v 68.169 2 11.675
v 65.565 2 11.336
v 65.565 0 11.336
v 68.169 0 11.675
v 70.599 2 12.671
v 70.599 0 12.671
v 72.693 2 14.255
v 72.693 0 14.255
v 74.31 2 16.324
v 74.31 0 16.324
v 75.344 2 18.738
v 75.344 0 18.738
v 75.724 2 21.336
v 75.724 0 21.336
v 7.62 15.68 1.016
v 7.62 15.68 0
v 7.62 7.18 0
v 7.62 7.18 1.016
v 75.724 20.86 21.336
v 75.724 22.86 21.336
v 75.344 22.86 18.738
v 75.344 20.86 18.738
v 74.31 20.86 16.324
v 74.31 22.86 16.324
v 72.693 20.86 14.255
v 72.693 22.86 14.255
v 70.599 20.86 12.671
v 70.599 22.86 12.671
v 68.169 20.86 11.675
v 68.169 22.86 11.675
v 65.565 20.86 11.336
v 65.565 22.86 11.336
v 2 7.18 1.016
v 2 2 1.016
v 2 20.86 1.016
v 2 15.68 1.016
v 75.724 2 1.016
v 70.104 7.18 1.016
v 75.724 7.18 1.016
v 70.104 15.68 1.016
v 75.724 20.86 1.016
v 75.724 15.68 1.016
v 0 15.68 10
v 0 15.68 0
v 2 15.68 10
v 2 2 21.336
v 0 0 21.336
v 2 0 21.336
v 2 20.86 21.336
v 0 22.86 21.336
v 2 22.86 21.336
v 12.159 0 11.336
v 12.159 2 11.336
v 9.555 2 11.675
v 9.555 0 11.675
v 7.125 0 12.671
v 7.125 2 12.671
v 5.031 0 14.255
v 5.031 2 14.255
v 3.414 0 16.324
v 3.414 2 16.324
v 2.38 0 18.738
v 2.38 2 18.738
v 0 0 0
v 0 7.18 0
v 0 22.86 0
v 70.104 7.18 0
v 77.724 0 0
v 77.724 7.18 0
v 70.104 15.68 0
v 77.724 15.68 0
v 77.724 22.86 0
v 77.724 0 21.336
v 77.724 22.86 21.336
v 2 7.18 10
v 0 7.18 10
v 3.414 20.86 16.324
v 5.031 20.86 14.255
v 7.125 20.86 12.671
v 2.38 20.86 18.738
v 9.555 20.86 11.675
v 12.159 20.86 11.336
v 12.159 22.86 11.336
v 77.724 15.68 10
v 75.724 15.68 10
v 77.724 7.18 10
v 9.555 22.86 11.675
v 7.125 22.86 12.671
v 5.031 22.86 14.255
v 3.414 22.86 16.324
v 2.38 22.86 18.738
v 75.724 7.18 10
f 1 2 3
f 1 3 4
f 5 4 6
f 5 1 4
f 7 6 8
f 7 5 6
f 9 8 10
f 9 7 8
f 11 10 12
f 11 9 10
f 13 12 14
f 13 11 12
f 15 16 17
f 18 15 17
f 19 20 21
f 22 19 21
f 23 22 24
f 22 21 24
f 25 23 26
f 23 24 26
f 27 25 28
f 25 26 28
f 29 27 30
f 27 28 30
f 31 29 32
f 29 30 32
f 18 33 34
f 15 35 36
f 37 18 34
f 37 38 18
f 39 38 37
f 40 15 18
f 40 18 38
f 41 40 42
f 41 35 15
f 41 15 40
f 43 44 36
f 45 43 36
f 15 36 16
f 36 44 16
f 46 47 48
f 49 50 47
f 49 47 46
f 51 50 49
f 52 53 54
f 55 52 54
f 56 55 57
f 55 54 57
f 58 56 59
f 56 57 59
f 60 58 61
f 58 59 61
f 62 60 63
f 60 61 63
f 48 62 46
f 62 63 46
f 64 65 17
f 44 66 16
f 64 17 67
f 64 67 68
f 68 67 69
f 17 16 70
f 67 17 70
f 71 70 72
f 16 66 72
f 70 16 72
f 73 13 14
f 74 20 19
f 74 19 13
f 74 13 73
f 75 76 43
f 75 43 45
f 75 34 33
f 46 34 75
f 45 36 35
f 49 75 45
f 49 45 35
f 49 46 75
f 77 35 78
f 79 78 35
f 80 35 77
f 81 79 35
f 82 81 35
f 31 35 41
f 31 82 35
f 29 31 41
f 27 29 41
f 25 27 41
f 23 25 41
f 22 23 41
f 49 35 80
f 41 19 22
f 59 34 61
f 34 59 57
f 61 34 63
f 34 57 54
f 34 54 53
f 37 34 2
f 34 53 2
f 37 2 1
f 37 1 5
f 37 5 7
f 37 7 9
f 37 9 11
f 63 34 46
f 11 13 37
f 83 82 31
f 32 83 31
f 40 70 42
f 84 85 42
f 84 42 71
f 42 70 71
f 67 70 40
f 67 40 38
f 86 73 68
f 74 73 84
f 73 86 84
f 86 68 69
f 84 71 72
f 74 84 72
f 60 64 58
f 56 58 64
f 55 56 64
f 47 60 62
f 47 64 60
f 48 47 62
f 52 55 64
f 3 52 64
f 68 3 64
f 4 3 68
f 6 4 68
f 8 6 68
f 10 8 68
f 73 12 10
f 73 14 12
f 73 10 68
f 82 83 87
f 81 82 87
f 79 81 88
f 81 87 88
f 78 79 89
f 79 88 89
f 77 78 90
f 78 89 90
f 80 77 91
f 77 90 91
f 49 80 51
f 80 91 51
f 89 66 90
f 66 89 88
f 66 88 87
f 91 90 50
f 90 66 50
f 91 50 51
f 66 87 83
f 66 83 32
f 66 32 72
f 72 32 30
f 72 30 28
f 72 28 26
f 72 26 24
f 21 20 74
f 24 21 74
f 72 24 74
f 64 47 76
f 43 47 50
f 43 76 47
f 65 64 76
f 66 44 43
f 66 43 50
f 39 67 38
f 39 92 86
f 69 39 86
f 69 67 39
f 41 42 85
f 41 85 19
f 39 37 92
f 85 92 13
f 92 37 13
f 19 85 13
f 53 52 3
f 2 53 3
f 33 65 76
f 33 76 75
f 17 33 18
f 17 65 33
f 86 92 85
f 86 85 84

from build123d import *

# Parameters (mm, degrees)
F0_W          = 77.724
F0_H          = 22.86
F1_DEPTH      = 21.336
F2_W          = 73.724
F2_H          = 18.86
F3_DEPTH      = 20.32
F4_W          = 7.62
F4_H          = 8.5
F5_DEPTH      = 10
F6_W          = 73.724
F6_H          = 10
F7_DEPTH      = 25
F7_DEPTH_BACK = 25
F8_T1_DEPTH   = 2
F8_T3_DEPTH   = 2
F8_T8_DEPTH   = 52.7937003968
F8_T14_DEPTH  = 52.7937003968
F8_T20_DEPTH  = 52.7937003968
F8_T26_DEPTH  = 52.7937003968


# Not quite as in the source:
# - a fillet or chamfer that OpenCascade refuses, or shapes differently, is made with other operations: its cross-section is extruded or revolved along the edge and cut away or added


with BuildPart() as f1:
    # F0 (on Top) → F1 (new body)
    with BuildSketch(Plane.XY):
        with Locations((38.862, 11.43)):
            Rectangle(F0_W, F0_H)
    extrude(amount=F1_DEPTH)

    # F2 (on face) → F3 (cut)
    with BuildSketch(Plane.XY.offset(21.336)):
        with Locations((38.862, 11.43)):
            Rectangle(F2_W, F2_H)
    extrude(amount=-F3_DEPTH, mode=Mode.SUBTRACT)

    # F4 (on face) → F5 (cut)
    with BuildSketch(Plane(origin=(0, 0, 0), x_dir=(1, 0, 0), z_dir=(0, 0, -1))):
        with Locations((3.81, -11.43)):
            Rectangle(F4_W, F4_H)
        with Locations((73.914, -11.43)):
            Rectangle(F4_W, F4_H)
    extrude(amount=-F5_DEPTH, mode=Mode.SUBTRACT)

    # F6 (on Front) → F7 (cut, two sides)
    with BuildSketch(Plane.XZ) as f7_sk:
        with Locations((38.862, 16.336)):
            Rectangle(F6_W, F6_H)
    extrude(amount=-F7_DEPTH, mode=Mode.SUBTRACT)
    extrude(f7_sk.sketch, amount=F7_DEPTH_BACK, mode=Mode.SUBTRACT)

    # F8: fillet of radius 10.16 on 4 edges, made by hand

    # F8_s2 → F8_t1 (join)
    with BuildSketch(Plane.XZ.offset(-2)):
        with BuildLine():
            ThreePointArc((12.1587400794, 11.336), (5.0313282069, 14.2554475349), (2, 21.336))
            Line((2, 21.336), (2, 11.336))
            Line((2, 11.336), (12.1587400794, 11.336))
        make_face()
        with BuildLine():
            ThreePointArc((65.5652599206, 11.336), (72.6926717931, 14.2554475349), (75.724, 21.336))
            Line((75.724, 21.336), (75.724, 11.336))
            Line((75.724, 11.336), (65.5652599206, 11.336))
        make_face()
    extrude(amount=F8_T1_DEPTH)

    # F8_s4 → F8_t3 (join)
    with BuildSketch(Plane.XZ.offset(-22.86)):
        with BuildLine():
            ThreePointArc((12.1587400794, 11.336), (5.0313282069, 14.2554475349), (2, 21.336))
            Line((2, 21.336), (2, 11.336))
            Line((2, 11.336), (12.1587400794, 11.336))
        make_face()
        with BuildLine():
            ThreePointArc((75.724, 21.336), (72.6926717931, 14.2554475349), (65.5652599206, 11.336))
            Line((65.5652599206, 11.336), (75.724, 11.336))
            Line((75.724, 11.336), (75.724, 21.336))
        make_face()
    extrude(amount=F8_T3_DEPTH)


with BuildPart() as f8_tool6:
    # F8_s7 → F8_t8 (new body)
    with BuildSketch(Plane.XZ.offset(-27.3968501984)):
        with BuildLine():
            ThreePointArc((12.1587400794, 11.336), (5.0313282069, 14.2554475349), (2, 21.336))
            Line((2, 21.336), (2, 11.336))
            Line((2, 11.336), (12.1587400794, 11.336))
        make_face()
    extrude(amount=F8_T8_DEPTH)

    split(bisect_by=Plane.XZ.offset(-22.86), keep=Keep.TOP)

    split(bisect_by=Plane.XZ.offset(-20.86), keep=Keep.BOTTOM)


with BuildPart() as f1_1:
    add(f1.part)

    # F8_t5: union F8_tool6
    add(f8_tool6.part)


with BuildPart() as f8_tool12:
    # F8_s13 → F8_t14 (new body)
    with BuildSketch(Plane.XZ.offset(-48.2568501984)):
        with BuildLine():
            ThreePointArc((12.1587400794, 11.336), (5.0313282069, 14.2554475349), (2, 21.336))
            Line((2, 21.336), (2, 11.336))
            Line((2, 11.336), (12.1587400794, 11.336))
        make_face()
    extrude(amount=F8_T14_DEPTH)

    split(bisect_by=Plane.XZ.offset(-2), keep=Keep.TOP)

    split(bisect_by=Plane.XZ, keep=Keep.BOTTOM)


with BuildPart() as f1_2:
    add(f1_1.part)

    # F8_t11: union F8_tool12
    add(f8_tool12.part)


with BuildPart() as f8_tool18:
    # F8_s19 → F8_t20 (new body)
    with BuildSketch(Plane.XZ.offset(25.3968501984)):
        with BuildLine():
            ThreePointArc((65.5652599206, 11.336), (72.6926717931, 14.2554475349), (75.724, 21.336))
            Line((75.724, 21.336), (75.724, 11.336))
            Line((75.724, 11.336), (65.5652599206, 11.336))
        make_face()
    extrude(amount=-F8_T20_DEPTH)

    split(bisect_by=Plane.XZ.offset(-22.86), keep=Keep.TOP)

    split(bisect_by=Plane.XZ.offset(-20.86), keep=Keep.BOTTOM)


with BuildPart() as f1_3:
    add(f1_2.part)

    # F8_t17: union F8_tool18
    add(f8_tool18.part)


with BuildPart() as f8_tool24:
    # F8_s25 → F8_t26 (new body)
    with BuildSketch(Plane.XZ.offset(4.5368501984)):
        with BuildLine():
            ThreePointArc((75.724, 21.336), (72.6926717931, 14.2554475349), (65.5652599206, 11.336))
            Line((65.5652599206, 11.336), (75.724, 11.336))
            Line((75.724, 11.336), (75.724, 21.336))
        make_face()
    extrude(amount=-F8_T26_DEPTH)

    split(bisect_by=Plane.XZ.offset(-2), keep=Keep.TOP)

    split(bisect_by=Plane.XZ, keep=Keep.BOTTOM)


with BuildPart() as f1_4:
    add(f1_3.part)

    # F8_t23: union F8_tool24
    add(f8_tool24.part)


solid = f1_4.part
